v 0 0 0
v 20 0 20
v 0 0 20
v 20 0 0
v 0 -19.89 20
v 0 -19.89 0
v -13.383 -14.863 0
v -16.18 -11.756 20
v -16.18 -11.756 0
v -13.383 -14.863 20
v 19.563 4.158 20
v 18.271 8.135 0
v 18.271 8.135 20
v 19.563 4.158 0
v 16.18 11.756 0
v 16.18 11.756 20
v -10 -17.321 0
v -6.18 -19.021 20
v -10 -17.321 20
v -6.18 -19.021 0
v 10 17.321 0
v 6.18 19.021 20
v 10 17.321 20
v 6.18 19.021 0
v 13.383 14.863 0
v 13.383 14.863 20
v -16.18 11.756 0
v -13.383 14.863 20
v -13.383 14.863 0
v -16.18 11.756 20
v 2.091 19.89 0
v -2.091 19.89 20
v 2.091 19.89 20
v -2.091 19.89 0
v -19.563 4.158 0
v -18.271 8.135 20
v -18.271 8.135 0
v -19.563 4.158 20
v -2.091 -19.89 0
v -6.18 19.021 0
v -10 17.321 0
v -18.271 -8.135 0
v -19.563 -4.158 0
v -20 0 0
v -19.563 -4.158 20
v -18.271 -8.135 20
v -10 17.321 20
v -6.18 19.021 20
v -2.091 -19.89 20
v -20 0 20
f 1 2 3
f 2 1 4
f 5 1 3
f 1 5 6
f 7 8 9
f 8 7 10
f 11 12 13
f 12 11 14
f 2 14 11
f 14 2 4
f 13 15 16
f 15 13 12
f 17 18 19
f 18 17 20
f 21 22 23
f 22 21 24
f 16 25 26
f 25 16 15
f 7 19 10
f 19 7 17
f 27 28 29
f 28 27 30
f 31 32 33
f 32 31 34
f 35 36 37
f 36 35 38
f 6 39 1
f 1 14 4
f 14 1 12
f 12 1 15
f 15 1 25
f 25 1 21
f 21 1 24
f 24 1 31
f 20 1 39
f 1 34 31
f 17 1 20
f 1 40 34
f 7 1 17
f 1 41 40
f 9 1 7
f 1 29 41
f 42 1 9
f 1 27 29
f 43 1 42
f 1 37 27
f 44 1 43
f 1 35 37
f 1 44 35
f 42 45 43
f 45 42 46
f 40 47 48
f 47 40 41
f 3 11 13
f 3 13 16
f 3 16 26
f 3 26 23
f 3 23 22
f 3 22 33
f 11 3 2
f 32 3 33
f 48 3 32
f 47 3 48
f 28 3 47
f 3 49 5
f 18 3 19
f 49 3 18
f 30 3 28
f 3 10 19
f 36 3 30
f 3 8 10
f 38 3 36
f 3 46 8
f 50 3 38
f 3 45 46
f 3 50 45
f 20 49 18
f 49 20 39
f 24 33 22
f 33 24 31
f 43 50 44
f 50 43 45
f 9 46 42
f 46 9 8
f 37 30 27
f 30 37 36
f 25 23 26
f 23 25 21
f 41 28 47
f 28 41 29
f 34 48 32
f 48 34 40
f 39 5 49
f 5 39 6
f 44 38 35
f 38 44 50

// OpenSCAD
// Transformations v.02
// (C) @oblomobka - 2015.04
// GPL3

// Transforma una forma en un sector de esa forma según un ángulo dado.

module sector(	angle, 		// es el ángulo del sector, lo que quedará de la forma original
				d=1000,		// valor auxiliar, será como mínimo igual al diámetro del cilindro que envuelve la forma original
				h=1000		// valor auxiliar, será como mínimo igual a la altura del cilindro que envuelve la forma original
				){

POINTS=[	[0,0,-h],
            [0,0,h],
            [d*cos(0*angle/4),d*sin(0*angle/4),-h],
            [d*cos(0*angle/4),d*sin(0*angle/4),h],
            [d*cos(1*angle/4),d*sin(1*angle/4),-h],
            [d*cos(1*angle/4),d*sin(1*angle/4),h],
            [d*cos(2*angle/4),d*sin(2*angle/4),-h],
            [d*cos(2*angle/4),d*sin(2*angle/4),h],
            [d*cos(3*angle/4),d*sin(3*angle/4),-h],
            [d*cos(3*angle/4),d*sin(3*angle/4),h],
            [d*cos(4*angle/4),d*sin(4*angle/4),-h],
            [d*cos(4*angle/4),d*sin(4*angle/4),h],
            ];

TRIANGLES=[	[0,1,2],
			[1,3,2],
			[2,3,4],
			[3,5,4],
			[4,5,6],
			[5,7,6],
			[6,7,8],
			[7,9,8],
			[8,9,10],
			[9,11,10],
			[10,11,0],
			[11,1,0],

			[5,3,1],
			[7,5,1],
			[9,7,1],
			[11,9,1],
			[0,2,4],
			[0,4,6],
			[0,6,8],
			[0,8,10]
			];

if(angle<=0 || angle>=360){
	children();
	}
	else{
		intersection(){
			polyhedron(points=POINTS,faces=TRIANGLES);
			children();
			}
		}
}

/////////////////////////////////////////////
// Ejemplo de uso de la tansformación sector()
sector (270)
    cylinder(r=40/2,h=20); 
